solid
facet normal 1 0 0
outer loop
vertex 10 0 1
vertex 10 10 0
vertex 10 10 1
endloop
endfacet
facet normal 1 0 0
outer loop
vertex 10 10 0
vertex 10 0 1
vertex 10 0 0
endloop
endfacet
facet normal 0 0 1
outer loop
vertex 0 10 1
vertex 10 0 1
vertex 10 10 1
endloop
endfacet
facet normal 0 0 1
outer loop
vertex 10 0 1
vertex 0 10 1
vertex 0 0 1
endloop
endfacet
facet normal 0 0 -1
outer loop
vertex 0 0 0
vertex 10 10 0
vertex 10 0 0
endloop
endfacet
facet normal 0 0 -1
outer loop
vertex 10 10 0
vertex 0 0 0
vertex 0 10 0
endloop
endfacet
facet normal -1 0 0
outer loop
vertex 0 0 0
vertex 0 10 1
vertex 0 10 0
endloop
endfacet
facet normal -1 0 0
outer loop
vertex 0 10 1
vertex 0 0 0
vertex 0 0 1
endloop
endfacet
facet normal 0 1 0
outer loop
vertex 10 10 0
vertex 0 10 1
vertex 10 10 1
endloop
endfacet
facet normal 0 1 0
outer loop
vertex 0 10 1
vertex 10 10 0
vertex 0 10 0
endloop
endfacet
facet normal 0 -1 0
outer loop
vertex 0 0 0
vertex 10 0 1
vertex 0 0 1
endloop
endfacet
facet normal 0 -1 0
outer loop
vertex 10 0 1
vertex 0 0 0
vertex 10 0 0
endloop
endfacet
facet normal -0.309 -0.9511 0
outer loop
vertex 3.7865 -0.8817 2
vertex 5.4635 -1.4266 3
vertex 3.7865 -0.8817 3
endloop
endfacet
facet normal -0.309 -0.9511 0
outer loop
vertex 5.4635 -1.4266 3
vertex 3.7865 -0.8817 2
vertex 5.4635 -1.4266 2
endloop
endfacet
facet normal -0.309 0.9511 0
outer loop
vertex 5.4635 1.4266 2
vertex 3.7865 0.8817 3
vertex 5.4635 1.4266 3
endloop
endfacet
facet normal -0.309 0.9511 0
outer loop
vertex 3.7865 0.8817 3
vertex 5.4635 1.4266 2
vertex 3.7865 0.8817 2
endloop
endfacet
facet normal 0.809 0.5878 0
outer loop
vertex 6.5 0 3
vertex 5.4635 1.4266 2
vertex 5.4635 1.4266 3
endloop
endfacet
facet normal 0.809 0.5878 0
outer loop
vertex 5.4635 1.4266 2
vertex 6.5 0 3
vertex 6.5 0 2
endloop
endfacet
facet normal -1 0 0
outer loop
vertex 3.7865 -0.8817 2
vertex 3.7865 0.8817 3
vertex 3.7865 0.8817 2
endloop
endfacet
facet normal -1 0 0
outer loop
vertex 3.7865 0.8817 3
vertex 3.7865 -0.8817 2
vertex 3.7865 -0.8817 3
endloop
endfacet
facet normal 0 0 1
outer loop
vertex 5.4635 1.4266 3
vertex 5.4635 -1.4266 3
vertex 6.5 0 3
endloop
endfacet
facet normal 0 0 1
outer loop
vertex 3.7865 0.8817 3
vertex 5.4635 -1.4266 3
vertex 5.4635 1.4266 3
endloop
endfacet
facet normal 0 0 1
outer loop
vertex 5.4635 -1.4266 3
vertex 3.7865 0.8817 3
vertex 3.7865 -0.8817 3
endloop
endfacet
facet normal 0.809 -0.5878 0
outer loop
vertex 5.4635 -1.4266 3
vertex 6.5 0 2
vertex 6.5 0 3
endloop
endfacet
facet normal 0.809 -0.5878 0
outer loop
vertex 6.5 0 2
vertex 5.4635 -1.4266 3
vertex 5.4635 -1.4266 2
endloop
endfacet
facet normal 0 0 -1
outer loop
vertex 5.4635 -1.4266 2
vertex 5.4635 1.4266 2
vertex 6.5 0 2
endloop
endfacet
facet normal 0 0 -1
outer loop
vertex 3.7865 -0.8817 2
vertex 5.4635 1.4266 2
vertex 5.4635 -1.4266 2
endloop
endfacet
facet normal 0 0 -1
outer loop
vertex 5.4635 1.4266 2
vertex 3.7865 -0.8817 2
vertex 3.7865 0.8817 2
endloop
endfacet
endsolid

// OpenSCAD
// file: triangle.scad
module triangle(base=10, length=10, rise=2.5, z=1){
    
    points=[
        //bottom and top triangle portion
        [0,0,0],[0,0,z],[0,base,0],[0,base,z],
        [length,rise,0],[length,rise,z],
    ];
    
    faces=[
        [0,2,4], //bot
        [5,3,1], //top
        [0,2,3,1], //tangent brick
        [0,1,5,4], //side square
        [4,5,3,2], //side square
    ];
           
        
     polyhedron(points, faces);
        
        
 
    
    }
//triangle();
// main file
use <triangle.scad>;

cube([10,10,1]);
color("blue")
translate([5,0,2]) cylinder(h=1, r=1.5);
color("blue")
translate([6,1,2]) rotate([0,0,90]) triangle(base=2,length=4, rise=1,z=1);
